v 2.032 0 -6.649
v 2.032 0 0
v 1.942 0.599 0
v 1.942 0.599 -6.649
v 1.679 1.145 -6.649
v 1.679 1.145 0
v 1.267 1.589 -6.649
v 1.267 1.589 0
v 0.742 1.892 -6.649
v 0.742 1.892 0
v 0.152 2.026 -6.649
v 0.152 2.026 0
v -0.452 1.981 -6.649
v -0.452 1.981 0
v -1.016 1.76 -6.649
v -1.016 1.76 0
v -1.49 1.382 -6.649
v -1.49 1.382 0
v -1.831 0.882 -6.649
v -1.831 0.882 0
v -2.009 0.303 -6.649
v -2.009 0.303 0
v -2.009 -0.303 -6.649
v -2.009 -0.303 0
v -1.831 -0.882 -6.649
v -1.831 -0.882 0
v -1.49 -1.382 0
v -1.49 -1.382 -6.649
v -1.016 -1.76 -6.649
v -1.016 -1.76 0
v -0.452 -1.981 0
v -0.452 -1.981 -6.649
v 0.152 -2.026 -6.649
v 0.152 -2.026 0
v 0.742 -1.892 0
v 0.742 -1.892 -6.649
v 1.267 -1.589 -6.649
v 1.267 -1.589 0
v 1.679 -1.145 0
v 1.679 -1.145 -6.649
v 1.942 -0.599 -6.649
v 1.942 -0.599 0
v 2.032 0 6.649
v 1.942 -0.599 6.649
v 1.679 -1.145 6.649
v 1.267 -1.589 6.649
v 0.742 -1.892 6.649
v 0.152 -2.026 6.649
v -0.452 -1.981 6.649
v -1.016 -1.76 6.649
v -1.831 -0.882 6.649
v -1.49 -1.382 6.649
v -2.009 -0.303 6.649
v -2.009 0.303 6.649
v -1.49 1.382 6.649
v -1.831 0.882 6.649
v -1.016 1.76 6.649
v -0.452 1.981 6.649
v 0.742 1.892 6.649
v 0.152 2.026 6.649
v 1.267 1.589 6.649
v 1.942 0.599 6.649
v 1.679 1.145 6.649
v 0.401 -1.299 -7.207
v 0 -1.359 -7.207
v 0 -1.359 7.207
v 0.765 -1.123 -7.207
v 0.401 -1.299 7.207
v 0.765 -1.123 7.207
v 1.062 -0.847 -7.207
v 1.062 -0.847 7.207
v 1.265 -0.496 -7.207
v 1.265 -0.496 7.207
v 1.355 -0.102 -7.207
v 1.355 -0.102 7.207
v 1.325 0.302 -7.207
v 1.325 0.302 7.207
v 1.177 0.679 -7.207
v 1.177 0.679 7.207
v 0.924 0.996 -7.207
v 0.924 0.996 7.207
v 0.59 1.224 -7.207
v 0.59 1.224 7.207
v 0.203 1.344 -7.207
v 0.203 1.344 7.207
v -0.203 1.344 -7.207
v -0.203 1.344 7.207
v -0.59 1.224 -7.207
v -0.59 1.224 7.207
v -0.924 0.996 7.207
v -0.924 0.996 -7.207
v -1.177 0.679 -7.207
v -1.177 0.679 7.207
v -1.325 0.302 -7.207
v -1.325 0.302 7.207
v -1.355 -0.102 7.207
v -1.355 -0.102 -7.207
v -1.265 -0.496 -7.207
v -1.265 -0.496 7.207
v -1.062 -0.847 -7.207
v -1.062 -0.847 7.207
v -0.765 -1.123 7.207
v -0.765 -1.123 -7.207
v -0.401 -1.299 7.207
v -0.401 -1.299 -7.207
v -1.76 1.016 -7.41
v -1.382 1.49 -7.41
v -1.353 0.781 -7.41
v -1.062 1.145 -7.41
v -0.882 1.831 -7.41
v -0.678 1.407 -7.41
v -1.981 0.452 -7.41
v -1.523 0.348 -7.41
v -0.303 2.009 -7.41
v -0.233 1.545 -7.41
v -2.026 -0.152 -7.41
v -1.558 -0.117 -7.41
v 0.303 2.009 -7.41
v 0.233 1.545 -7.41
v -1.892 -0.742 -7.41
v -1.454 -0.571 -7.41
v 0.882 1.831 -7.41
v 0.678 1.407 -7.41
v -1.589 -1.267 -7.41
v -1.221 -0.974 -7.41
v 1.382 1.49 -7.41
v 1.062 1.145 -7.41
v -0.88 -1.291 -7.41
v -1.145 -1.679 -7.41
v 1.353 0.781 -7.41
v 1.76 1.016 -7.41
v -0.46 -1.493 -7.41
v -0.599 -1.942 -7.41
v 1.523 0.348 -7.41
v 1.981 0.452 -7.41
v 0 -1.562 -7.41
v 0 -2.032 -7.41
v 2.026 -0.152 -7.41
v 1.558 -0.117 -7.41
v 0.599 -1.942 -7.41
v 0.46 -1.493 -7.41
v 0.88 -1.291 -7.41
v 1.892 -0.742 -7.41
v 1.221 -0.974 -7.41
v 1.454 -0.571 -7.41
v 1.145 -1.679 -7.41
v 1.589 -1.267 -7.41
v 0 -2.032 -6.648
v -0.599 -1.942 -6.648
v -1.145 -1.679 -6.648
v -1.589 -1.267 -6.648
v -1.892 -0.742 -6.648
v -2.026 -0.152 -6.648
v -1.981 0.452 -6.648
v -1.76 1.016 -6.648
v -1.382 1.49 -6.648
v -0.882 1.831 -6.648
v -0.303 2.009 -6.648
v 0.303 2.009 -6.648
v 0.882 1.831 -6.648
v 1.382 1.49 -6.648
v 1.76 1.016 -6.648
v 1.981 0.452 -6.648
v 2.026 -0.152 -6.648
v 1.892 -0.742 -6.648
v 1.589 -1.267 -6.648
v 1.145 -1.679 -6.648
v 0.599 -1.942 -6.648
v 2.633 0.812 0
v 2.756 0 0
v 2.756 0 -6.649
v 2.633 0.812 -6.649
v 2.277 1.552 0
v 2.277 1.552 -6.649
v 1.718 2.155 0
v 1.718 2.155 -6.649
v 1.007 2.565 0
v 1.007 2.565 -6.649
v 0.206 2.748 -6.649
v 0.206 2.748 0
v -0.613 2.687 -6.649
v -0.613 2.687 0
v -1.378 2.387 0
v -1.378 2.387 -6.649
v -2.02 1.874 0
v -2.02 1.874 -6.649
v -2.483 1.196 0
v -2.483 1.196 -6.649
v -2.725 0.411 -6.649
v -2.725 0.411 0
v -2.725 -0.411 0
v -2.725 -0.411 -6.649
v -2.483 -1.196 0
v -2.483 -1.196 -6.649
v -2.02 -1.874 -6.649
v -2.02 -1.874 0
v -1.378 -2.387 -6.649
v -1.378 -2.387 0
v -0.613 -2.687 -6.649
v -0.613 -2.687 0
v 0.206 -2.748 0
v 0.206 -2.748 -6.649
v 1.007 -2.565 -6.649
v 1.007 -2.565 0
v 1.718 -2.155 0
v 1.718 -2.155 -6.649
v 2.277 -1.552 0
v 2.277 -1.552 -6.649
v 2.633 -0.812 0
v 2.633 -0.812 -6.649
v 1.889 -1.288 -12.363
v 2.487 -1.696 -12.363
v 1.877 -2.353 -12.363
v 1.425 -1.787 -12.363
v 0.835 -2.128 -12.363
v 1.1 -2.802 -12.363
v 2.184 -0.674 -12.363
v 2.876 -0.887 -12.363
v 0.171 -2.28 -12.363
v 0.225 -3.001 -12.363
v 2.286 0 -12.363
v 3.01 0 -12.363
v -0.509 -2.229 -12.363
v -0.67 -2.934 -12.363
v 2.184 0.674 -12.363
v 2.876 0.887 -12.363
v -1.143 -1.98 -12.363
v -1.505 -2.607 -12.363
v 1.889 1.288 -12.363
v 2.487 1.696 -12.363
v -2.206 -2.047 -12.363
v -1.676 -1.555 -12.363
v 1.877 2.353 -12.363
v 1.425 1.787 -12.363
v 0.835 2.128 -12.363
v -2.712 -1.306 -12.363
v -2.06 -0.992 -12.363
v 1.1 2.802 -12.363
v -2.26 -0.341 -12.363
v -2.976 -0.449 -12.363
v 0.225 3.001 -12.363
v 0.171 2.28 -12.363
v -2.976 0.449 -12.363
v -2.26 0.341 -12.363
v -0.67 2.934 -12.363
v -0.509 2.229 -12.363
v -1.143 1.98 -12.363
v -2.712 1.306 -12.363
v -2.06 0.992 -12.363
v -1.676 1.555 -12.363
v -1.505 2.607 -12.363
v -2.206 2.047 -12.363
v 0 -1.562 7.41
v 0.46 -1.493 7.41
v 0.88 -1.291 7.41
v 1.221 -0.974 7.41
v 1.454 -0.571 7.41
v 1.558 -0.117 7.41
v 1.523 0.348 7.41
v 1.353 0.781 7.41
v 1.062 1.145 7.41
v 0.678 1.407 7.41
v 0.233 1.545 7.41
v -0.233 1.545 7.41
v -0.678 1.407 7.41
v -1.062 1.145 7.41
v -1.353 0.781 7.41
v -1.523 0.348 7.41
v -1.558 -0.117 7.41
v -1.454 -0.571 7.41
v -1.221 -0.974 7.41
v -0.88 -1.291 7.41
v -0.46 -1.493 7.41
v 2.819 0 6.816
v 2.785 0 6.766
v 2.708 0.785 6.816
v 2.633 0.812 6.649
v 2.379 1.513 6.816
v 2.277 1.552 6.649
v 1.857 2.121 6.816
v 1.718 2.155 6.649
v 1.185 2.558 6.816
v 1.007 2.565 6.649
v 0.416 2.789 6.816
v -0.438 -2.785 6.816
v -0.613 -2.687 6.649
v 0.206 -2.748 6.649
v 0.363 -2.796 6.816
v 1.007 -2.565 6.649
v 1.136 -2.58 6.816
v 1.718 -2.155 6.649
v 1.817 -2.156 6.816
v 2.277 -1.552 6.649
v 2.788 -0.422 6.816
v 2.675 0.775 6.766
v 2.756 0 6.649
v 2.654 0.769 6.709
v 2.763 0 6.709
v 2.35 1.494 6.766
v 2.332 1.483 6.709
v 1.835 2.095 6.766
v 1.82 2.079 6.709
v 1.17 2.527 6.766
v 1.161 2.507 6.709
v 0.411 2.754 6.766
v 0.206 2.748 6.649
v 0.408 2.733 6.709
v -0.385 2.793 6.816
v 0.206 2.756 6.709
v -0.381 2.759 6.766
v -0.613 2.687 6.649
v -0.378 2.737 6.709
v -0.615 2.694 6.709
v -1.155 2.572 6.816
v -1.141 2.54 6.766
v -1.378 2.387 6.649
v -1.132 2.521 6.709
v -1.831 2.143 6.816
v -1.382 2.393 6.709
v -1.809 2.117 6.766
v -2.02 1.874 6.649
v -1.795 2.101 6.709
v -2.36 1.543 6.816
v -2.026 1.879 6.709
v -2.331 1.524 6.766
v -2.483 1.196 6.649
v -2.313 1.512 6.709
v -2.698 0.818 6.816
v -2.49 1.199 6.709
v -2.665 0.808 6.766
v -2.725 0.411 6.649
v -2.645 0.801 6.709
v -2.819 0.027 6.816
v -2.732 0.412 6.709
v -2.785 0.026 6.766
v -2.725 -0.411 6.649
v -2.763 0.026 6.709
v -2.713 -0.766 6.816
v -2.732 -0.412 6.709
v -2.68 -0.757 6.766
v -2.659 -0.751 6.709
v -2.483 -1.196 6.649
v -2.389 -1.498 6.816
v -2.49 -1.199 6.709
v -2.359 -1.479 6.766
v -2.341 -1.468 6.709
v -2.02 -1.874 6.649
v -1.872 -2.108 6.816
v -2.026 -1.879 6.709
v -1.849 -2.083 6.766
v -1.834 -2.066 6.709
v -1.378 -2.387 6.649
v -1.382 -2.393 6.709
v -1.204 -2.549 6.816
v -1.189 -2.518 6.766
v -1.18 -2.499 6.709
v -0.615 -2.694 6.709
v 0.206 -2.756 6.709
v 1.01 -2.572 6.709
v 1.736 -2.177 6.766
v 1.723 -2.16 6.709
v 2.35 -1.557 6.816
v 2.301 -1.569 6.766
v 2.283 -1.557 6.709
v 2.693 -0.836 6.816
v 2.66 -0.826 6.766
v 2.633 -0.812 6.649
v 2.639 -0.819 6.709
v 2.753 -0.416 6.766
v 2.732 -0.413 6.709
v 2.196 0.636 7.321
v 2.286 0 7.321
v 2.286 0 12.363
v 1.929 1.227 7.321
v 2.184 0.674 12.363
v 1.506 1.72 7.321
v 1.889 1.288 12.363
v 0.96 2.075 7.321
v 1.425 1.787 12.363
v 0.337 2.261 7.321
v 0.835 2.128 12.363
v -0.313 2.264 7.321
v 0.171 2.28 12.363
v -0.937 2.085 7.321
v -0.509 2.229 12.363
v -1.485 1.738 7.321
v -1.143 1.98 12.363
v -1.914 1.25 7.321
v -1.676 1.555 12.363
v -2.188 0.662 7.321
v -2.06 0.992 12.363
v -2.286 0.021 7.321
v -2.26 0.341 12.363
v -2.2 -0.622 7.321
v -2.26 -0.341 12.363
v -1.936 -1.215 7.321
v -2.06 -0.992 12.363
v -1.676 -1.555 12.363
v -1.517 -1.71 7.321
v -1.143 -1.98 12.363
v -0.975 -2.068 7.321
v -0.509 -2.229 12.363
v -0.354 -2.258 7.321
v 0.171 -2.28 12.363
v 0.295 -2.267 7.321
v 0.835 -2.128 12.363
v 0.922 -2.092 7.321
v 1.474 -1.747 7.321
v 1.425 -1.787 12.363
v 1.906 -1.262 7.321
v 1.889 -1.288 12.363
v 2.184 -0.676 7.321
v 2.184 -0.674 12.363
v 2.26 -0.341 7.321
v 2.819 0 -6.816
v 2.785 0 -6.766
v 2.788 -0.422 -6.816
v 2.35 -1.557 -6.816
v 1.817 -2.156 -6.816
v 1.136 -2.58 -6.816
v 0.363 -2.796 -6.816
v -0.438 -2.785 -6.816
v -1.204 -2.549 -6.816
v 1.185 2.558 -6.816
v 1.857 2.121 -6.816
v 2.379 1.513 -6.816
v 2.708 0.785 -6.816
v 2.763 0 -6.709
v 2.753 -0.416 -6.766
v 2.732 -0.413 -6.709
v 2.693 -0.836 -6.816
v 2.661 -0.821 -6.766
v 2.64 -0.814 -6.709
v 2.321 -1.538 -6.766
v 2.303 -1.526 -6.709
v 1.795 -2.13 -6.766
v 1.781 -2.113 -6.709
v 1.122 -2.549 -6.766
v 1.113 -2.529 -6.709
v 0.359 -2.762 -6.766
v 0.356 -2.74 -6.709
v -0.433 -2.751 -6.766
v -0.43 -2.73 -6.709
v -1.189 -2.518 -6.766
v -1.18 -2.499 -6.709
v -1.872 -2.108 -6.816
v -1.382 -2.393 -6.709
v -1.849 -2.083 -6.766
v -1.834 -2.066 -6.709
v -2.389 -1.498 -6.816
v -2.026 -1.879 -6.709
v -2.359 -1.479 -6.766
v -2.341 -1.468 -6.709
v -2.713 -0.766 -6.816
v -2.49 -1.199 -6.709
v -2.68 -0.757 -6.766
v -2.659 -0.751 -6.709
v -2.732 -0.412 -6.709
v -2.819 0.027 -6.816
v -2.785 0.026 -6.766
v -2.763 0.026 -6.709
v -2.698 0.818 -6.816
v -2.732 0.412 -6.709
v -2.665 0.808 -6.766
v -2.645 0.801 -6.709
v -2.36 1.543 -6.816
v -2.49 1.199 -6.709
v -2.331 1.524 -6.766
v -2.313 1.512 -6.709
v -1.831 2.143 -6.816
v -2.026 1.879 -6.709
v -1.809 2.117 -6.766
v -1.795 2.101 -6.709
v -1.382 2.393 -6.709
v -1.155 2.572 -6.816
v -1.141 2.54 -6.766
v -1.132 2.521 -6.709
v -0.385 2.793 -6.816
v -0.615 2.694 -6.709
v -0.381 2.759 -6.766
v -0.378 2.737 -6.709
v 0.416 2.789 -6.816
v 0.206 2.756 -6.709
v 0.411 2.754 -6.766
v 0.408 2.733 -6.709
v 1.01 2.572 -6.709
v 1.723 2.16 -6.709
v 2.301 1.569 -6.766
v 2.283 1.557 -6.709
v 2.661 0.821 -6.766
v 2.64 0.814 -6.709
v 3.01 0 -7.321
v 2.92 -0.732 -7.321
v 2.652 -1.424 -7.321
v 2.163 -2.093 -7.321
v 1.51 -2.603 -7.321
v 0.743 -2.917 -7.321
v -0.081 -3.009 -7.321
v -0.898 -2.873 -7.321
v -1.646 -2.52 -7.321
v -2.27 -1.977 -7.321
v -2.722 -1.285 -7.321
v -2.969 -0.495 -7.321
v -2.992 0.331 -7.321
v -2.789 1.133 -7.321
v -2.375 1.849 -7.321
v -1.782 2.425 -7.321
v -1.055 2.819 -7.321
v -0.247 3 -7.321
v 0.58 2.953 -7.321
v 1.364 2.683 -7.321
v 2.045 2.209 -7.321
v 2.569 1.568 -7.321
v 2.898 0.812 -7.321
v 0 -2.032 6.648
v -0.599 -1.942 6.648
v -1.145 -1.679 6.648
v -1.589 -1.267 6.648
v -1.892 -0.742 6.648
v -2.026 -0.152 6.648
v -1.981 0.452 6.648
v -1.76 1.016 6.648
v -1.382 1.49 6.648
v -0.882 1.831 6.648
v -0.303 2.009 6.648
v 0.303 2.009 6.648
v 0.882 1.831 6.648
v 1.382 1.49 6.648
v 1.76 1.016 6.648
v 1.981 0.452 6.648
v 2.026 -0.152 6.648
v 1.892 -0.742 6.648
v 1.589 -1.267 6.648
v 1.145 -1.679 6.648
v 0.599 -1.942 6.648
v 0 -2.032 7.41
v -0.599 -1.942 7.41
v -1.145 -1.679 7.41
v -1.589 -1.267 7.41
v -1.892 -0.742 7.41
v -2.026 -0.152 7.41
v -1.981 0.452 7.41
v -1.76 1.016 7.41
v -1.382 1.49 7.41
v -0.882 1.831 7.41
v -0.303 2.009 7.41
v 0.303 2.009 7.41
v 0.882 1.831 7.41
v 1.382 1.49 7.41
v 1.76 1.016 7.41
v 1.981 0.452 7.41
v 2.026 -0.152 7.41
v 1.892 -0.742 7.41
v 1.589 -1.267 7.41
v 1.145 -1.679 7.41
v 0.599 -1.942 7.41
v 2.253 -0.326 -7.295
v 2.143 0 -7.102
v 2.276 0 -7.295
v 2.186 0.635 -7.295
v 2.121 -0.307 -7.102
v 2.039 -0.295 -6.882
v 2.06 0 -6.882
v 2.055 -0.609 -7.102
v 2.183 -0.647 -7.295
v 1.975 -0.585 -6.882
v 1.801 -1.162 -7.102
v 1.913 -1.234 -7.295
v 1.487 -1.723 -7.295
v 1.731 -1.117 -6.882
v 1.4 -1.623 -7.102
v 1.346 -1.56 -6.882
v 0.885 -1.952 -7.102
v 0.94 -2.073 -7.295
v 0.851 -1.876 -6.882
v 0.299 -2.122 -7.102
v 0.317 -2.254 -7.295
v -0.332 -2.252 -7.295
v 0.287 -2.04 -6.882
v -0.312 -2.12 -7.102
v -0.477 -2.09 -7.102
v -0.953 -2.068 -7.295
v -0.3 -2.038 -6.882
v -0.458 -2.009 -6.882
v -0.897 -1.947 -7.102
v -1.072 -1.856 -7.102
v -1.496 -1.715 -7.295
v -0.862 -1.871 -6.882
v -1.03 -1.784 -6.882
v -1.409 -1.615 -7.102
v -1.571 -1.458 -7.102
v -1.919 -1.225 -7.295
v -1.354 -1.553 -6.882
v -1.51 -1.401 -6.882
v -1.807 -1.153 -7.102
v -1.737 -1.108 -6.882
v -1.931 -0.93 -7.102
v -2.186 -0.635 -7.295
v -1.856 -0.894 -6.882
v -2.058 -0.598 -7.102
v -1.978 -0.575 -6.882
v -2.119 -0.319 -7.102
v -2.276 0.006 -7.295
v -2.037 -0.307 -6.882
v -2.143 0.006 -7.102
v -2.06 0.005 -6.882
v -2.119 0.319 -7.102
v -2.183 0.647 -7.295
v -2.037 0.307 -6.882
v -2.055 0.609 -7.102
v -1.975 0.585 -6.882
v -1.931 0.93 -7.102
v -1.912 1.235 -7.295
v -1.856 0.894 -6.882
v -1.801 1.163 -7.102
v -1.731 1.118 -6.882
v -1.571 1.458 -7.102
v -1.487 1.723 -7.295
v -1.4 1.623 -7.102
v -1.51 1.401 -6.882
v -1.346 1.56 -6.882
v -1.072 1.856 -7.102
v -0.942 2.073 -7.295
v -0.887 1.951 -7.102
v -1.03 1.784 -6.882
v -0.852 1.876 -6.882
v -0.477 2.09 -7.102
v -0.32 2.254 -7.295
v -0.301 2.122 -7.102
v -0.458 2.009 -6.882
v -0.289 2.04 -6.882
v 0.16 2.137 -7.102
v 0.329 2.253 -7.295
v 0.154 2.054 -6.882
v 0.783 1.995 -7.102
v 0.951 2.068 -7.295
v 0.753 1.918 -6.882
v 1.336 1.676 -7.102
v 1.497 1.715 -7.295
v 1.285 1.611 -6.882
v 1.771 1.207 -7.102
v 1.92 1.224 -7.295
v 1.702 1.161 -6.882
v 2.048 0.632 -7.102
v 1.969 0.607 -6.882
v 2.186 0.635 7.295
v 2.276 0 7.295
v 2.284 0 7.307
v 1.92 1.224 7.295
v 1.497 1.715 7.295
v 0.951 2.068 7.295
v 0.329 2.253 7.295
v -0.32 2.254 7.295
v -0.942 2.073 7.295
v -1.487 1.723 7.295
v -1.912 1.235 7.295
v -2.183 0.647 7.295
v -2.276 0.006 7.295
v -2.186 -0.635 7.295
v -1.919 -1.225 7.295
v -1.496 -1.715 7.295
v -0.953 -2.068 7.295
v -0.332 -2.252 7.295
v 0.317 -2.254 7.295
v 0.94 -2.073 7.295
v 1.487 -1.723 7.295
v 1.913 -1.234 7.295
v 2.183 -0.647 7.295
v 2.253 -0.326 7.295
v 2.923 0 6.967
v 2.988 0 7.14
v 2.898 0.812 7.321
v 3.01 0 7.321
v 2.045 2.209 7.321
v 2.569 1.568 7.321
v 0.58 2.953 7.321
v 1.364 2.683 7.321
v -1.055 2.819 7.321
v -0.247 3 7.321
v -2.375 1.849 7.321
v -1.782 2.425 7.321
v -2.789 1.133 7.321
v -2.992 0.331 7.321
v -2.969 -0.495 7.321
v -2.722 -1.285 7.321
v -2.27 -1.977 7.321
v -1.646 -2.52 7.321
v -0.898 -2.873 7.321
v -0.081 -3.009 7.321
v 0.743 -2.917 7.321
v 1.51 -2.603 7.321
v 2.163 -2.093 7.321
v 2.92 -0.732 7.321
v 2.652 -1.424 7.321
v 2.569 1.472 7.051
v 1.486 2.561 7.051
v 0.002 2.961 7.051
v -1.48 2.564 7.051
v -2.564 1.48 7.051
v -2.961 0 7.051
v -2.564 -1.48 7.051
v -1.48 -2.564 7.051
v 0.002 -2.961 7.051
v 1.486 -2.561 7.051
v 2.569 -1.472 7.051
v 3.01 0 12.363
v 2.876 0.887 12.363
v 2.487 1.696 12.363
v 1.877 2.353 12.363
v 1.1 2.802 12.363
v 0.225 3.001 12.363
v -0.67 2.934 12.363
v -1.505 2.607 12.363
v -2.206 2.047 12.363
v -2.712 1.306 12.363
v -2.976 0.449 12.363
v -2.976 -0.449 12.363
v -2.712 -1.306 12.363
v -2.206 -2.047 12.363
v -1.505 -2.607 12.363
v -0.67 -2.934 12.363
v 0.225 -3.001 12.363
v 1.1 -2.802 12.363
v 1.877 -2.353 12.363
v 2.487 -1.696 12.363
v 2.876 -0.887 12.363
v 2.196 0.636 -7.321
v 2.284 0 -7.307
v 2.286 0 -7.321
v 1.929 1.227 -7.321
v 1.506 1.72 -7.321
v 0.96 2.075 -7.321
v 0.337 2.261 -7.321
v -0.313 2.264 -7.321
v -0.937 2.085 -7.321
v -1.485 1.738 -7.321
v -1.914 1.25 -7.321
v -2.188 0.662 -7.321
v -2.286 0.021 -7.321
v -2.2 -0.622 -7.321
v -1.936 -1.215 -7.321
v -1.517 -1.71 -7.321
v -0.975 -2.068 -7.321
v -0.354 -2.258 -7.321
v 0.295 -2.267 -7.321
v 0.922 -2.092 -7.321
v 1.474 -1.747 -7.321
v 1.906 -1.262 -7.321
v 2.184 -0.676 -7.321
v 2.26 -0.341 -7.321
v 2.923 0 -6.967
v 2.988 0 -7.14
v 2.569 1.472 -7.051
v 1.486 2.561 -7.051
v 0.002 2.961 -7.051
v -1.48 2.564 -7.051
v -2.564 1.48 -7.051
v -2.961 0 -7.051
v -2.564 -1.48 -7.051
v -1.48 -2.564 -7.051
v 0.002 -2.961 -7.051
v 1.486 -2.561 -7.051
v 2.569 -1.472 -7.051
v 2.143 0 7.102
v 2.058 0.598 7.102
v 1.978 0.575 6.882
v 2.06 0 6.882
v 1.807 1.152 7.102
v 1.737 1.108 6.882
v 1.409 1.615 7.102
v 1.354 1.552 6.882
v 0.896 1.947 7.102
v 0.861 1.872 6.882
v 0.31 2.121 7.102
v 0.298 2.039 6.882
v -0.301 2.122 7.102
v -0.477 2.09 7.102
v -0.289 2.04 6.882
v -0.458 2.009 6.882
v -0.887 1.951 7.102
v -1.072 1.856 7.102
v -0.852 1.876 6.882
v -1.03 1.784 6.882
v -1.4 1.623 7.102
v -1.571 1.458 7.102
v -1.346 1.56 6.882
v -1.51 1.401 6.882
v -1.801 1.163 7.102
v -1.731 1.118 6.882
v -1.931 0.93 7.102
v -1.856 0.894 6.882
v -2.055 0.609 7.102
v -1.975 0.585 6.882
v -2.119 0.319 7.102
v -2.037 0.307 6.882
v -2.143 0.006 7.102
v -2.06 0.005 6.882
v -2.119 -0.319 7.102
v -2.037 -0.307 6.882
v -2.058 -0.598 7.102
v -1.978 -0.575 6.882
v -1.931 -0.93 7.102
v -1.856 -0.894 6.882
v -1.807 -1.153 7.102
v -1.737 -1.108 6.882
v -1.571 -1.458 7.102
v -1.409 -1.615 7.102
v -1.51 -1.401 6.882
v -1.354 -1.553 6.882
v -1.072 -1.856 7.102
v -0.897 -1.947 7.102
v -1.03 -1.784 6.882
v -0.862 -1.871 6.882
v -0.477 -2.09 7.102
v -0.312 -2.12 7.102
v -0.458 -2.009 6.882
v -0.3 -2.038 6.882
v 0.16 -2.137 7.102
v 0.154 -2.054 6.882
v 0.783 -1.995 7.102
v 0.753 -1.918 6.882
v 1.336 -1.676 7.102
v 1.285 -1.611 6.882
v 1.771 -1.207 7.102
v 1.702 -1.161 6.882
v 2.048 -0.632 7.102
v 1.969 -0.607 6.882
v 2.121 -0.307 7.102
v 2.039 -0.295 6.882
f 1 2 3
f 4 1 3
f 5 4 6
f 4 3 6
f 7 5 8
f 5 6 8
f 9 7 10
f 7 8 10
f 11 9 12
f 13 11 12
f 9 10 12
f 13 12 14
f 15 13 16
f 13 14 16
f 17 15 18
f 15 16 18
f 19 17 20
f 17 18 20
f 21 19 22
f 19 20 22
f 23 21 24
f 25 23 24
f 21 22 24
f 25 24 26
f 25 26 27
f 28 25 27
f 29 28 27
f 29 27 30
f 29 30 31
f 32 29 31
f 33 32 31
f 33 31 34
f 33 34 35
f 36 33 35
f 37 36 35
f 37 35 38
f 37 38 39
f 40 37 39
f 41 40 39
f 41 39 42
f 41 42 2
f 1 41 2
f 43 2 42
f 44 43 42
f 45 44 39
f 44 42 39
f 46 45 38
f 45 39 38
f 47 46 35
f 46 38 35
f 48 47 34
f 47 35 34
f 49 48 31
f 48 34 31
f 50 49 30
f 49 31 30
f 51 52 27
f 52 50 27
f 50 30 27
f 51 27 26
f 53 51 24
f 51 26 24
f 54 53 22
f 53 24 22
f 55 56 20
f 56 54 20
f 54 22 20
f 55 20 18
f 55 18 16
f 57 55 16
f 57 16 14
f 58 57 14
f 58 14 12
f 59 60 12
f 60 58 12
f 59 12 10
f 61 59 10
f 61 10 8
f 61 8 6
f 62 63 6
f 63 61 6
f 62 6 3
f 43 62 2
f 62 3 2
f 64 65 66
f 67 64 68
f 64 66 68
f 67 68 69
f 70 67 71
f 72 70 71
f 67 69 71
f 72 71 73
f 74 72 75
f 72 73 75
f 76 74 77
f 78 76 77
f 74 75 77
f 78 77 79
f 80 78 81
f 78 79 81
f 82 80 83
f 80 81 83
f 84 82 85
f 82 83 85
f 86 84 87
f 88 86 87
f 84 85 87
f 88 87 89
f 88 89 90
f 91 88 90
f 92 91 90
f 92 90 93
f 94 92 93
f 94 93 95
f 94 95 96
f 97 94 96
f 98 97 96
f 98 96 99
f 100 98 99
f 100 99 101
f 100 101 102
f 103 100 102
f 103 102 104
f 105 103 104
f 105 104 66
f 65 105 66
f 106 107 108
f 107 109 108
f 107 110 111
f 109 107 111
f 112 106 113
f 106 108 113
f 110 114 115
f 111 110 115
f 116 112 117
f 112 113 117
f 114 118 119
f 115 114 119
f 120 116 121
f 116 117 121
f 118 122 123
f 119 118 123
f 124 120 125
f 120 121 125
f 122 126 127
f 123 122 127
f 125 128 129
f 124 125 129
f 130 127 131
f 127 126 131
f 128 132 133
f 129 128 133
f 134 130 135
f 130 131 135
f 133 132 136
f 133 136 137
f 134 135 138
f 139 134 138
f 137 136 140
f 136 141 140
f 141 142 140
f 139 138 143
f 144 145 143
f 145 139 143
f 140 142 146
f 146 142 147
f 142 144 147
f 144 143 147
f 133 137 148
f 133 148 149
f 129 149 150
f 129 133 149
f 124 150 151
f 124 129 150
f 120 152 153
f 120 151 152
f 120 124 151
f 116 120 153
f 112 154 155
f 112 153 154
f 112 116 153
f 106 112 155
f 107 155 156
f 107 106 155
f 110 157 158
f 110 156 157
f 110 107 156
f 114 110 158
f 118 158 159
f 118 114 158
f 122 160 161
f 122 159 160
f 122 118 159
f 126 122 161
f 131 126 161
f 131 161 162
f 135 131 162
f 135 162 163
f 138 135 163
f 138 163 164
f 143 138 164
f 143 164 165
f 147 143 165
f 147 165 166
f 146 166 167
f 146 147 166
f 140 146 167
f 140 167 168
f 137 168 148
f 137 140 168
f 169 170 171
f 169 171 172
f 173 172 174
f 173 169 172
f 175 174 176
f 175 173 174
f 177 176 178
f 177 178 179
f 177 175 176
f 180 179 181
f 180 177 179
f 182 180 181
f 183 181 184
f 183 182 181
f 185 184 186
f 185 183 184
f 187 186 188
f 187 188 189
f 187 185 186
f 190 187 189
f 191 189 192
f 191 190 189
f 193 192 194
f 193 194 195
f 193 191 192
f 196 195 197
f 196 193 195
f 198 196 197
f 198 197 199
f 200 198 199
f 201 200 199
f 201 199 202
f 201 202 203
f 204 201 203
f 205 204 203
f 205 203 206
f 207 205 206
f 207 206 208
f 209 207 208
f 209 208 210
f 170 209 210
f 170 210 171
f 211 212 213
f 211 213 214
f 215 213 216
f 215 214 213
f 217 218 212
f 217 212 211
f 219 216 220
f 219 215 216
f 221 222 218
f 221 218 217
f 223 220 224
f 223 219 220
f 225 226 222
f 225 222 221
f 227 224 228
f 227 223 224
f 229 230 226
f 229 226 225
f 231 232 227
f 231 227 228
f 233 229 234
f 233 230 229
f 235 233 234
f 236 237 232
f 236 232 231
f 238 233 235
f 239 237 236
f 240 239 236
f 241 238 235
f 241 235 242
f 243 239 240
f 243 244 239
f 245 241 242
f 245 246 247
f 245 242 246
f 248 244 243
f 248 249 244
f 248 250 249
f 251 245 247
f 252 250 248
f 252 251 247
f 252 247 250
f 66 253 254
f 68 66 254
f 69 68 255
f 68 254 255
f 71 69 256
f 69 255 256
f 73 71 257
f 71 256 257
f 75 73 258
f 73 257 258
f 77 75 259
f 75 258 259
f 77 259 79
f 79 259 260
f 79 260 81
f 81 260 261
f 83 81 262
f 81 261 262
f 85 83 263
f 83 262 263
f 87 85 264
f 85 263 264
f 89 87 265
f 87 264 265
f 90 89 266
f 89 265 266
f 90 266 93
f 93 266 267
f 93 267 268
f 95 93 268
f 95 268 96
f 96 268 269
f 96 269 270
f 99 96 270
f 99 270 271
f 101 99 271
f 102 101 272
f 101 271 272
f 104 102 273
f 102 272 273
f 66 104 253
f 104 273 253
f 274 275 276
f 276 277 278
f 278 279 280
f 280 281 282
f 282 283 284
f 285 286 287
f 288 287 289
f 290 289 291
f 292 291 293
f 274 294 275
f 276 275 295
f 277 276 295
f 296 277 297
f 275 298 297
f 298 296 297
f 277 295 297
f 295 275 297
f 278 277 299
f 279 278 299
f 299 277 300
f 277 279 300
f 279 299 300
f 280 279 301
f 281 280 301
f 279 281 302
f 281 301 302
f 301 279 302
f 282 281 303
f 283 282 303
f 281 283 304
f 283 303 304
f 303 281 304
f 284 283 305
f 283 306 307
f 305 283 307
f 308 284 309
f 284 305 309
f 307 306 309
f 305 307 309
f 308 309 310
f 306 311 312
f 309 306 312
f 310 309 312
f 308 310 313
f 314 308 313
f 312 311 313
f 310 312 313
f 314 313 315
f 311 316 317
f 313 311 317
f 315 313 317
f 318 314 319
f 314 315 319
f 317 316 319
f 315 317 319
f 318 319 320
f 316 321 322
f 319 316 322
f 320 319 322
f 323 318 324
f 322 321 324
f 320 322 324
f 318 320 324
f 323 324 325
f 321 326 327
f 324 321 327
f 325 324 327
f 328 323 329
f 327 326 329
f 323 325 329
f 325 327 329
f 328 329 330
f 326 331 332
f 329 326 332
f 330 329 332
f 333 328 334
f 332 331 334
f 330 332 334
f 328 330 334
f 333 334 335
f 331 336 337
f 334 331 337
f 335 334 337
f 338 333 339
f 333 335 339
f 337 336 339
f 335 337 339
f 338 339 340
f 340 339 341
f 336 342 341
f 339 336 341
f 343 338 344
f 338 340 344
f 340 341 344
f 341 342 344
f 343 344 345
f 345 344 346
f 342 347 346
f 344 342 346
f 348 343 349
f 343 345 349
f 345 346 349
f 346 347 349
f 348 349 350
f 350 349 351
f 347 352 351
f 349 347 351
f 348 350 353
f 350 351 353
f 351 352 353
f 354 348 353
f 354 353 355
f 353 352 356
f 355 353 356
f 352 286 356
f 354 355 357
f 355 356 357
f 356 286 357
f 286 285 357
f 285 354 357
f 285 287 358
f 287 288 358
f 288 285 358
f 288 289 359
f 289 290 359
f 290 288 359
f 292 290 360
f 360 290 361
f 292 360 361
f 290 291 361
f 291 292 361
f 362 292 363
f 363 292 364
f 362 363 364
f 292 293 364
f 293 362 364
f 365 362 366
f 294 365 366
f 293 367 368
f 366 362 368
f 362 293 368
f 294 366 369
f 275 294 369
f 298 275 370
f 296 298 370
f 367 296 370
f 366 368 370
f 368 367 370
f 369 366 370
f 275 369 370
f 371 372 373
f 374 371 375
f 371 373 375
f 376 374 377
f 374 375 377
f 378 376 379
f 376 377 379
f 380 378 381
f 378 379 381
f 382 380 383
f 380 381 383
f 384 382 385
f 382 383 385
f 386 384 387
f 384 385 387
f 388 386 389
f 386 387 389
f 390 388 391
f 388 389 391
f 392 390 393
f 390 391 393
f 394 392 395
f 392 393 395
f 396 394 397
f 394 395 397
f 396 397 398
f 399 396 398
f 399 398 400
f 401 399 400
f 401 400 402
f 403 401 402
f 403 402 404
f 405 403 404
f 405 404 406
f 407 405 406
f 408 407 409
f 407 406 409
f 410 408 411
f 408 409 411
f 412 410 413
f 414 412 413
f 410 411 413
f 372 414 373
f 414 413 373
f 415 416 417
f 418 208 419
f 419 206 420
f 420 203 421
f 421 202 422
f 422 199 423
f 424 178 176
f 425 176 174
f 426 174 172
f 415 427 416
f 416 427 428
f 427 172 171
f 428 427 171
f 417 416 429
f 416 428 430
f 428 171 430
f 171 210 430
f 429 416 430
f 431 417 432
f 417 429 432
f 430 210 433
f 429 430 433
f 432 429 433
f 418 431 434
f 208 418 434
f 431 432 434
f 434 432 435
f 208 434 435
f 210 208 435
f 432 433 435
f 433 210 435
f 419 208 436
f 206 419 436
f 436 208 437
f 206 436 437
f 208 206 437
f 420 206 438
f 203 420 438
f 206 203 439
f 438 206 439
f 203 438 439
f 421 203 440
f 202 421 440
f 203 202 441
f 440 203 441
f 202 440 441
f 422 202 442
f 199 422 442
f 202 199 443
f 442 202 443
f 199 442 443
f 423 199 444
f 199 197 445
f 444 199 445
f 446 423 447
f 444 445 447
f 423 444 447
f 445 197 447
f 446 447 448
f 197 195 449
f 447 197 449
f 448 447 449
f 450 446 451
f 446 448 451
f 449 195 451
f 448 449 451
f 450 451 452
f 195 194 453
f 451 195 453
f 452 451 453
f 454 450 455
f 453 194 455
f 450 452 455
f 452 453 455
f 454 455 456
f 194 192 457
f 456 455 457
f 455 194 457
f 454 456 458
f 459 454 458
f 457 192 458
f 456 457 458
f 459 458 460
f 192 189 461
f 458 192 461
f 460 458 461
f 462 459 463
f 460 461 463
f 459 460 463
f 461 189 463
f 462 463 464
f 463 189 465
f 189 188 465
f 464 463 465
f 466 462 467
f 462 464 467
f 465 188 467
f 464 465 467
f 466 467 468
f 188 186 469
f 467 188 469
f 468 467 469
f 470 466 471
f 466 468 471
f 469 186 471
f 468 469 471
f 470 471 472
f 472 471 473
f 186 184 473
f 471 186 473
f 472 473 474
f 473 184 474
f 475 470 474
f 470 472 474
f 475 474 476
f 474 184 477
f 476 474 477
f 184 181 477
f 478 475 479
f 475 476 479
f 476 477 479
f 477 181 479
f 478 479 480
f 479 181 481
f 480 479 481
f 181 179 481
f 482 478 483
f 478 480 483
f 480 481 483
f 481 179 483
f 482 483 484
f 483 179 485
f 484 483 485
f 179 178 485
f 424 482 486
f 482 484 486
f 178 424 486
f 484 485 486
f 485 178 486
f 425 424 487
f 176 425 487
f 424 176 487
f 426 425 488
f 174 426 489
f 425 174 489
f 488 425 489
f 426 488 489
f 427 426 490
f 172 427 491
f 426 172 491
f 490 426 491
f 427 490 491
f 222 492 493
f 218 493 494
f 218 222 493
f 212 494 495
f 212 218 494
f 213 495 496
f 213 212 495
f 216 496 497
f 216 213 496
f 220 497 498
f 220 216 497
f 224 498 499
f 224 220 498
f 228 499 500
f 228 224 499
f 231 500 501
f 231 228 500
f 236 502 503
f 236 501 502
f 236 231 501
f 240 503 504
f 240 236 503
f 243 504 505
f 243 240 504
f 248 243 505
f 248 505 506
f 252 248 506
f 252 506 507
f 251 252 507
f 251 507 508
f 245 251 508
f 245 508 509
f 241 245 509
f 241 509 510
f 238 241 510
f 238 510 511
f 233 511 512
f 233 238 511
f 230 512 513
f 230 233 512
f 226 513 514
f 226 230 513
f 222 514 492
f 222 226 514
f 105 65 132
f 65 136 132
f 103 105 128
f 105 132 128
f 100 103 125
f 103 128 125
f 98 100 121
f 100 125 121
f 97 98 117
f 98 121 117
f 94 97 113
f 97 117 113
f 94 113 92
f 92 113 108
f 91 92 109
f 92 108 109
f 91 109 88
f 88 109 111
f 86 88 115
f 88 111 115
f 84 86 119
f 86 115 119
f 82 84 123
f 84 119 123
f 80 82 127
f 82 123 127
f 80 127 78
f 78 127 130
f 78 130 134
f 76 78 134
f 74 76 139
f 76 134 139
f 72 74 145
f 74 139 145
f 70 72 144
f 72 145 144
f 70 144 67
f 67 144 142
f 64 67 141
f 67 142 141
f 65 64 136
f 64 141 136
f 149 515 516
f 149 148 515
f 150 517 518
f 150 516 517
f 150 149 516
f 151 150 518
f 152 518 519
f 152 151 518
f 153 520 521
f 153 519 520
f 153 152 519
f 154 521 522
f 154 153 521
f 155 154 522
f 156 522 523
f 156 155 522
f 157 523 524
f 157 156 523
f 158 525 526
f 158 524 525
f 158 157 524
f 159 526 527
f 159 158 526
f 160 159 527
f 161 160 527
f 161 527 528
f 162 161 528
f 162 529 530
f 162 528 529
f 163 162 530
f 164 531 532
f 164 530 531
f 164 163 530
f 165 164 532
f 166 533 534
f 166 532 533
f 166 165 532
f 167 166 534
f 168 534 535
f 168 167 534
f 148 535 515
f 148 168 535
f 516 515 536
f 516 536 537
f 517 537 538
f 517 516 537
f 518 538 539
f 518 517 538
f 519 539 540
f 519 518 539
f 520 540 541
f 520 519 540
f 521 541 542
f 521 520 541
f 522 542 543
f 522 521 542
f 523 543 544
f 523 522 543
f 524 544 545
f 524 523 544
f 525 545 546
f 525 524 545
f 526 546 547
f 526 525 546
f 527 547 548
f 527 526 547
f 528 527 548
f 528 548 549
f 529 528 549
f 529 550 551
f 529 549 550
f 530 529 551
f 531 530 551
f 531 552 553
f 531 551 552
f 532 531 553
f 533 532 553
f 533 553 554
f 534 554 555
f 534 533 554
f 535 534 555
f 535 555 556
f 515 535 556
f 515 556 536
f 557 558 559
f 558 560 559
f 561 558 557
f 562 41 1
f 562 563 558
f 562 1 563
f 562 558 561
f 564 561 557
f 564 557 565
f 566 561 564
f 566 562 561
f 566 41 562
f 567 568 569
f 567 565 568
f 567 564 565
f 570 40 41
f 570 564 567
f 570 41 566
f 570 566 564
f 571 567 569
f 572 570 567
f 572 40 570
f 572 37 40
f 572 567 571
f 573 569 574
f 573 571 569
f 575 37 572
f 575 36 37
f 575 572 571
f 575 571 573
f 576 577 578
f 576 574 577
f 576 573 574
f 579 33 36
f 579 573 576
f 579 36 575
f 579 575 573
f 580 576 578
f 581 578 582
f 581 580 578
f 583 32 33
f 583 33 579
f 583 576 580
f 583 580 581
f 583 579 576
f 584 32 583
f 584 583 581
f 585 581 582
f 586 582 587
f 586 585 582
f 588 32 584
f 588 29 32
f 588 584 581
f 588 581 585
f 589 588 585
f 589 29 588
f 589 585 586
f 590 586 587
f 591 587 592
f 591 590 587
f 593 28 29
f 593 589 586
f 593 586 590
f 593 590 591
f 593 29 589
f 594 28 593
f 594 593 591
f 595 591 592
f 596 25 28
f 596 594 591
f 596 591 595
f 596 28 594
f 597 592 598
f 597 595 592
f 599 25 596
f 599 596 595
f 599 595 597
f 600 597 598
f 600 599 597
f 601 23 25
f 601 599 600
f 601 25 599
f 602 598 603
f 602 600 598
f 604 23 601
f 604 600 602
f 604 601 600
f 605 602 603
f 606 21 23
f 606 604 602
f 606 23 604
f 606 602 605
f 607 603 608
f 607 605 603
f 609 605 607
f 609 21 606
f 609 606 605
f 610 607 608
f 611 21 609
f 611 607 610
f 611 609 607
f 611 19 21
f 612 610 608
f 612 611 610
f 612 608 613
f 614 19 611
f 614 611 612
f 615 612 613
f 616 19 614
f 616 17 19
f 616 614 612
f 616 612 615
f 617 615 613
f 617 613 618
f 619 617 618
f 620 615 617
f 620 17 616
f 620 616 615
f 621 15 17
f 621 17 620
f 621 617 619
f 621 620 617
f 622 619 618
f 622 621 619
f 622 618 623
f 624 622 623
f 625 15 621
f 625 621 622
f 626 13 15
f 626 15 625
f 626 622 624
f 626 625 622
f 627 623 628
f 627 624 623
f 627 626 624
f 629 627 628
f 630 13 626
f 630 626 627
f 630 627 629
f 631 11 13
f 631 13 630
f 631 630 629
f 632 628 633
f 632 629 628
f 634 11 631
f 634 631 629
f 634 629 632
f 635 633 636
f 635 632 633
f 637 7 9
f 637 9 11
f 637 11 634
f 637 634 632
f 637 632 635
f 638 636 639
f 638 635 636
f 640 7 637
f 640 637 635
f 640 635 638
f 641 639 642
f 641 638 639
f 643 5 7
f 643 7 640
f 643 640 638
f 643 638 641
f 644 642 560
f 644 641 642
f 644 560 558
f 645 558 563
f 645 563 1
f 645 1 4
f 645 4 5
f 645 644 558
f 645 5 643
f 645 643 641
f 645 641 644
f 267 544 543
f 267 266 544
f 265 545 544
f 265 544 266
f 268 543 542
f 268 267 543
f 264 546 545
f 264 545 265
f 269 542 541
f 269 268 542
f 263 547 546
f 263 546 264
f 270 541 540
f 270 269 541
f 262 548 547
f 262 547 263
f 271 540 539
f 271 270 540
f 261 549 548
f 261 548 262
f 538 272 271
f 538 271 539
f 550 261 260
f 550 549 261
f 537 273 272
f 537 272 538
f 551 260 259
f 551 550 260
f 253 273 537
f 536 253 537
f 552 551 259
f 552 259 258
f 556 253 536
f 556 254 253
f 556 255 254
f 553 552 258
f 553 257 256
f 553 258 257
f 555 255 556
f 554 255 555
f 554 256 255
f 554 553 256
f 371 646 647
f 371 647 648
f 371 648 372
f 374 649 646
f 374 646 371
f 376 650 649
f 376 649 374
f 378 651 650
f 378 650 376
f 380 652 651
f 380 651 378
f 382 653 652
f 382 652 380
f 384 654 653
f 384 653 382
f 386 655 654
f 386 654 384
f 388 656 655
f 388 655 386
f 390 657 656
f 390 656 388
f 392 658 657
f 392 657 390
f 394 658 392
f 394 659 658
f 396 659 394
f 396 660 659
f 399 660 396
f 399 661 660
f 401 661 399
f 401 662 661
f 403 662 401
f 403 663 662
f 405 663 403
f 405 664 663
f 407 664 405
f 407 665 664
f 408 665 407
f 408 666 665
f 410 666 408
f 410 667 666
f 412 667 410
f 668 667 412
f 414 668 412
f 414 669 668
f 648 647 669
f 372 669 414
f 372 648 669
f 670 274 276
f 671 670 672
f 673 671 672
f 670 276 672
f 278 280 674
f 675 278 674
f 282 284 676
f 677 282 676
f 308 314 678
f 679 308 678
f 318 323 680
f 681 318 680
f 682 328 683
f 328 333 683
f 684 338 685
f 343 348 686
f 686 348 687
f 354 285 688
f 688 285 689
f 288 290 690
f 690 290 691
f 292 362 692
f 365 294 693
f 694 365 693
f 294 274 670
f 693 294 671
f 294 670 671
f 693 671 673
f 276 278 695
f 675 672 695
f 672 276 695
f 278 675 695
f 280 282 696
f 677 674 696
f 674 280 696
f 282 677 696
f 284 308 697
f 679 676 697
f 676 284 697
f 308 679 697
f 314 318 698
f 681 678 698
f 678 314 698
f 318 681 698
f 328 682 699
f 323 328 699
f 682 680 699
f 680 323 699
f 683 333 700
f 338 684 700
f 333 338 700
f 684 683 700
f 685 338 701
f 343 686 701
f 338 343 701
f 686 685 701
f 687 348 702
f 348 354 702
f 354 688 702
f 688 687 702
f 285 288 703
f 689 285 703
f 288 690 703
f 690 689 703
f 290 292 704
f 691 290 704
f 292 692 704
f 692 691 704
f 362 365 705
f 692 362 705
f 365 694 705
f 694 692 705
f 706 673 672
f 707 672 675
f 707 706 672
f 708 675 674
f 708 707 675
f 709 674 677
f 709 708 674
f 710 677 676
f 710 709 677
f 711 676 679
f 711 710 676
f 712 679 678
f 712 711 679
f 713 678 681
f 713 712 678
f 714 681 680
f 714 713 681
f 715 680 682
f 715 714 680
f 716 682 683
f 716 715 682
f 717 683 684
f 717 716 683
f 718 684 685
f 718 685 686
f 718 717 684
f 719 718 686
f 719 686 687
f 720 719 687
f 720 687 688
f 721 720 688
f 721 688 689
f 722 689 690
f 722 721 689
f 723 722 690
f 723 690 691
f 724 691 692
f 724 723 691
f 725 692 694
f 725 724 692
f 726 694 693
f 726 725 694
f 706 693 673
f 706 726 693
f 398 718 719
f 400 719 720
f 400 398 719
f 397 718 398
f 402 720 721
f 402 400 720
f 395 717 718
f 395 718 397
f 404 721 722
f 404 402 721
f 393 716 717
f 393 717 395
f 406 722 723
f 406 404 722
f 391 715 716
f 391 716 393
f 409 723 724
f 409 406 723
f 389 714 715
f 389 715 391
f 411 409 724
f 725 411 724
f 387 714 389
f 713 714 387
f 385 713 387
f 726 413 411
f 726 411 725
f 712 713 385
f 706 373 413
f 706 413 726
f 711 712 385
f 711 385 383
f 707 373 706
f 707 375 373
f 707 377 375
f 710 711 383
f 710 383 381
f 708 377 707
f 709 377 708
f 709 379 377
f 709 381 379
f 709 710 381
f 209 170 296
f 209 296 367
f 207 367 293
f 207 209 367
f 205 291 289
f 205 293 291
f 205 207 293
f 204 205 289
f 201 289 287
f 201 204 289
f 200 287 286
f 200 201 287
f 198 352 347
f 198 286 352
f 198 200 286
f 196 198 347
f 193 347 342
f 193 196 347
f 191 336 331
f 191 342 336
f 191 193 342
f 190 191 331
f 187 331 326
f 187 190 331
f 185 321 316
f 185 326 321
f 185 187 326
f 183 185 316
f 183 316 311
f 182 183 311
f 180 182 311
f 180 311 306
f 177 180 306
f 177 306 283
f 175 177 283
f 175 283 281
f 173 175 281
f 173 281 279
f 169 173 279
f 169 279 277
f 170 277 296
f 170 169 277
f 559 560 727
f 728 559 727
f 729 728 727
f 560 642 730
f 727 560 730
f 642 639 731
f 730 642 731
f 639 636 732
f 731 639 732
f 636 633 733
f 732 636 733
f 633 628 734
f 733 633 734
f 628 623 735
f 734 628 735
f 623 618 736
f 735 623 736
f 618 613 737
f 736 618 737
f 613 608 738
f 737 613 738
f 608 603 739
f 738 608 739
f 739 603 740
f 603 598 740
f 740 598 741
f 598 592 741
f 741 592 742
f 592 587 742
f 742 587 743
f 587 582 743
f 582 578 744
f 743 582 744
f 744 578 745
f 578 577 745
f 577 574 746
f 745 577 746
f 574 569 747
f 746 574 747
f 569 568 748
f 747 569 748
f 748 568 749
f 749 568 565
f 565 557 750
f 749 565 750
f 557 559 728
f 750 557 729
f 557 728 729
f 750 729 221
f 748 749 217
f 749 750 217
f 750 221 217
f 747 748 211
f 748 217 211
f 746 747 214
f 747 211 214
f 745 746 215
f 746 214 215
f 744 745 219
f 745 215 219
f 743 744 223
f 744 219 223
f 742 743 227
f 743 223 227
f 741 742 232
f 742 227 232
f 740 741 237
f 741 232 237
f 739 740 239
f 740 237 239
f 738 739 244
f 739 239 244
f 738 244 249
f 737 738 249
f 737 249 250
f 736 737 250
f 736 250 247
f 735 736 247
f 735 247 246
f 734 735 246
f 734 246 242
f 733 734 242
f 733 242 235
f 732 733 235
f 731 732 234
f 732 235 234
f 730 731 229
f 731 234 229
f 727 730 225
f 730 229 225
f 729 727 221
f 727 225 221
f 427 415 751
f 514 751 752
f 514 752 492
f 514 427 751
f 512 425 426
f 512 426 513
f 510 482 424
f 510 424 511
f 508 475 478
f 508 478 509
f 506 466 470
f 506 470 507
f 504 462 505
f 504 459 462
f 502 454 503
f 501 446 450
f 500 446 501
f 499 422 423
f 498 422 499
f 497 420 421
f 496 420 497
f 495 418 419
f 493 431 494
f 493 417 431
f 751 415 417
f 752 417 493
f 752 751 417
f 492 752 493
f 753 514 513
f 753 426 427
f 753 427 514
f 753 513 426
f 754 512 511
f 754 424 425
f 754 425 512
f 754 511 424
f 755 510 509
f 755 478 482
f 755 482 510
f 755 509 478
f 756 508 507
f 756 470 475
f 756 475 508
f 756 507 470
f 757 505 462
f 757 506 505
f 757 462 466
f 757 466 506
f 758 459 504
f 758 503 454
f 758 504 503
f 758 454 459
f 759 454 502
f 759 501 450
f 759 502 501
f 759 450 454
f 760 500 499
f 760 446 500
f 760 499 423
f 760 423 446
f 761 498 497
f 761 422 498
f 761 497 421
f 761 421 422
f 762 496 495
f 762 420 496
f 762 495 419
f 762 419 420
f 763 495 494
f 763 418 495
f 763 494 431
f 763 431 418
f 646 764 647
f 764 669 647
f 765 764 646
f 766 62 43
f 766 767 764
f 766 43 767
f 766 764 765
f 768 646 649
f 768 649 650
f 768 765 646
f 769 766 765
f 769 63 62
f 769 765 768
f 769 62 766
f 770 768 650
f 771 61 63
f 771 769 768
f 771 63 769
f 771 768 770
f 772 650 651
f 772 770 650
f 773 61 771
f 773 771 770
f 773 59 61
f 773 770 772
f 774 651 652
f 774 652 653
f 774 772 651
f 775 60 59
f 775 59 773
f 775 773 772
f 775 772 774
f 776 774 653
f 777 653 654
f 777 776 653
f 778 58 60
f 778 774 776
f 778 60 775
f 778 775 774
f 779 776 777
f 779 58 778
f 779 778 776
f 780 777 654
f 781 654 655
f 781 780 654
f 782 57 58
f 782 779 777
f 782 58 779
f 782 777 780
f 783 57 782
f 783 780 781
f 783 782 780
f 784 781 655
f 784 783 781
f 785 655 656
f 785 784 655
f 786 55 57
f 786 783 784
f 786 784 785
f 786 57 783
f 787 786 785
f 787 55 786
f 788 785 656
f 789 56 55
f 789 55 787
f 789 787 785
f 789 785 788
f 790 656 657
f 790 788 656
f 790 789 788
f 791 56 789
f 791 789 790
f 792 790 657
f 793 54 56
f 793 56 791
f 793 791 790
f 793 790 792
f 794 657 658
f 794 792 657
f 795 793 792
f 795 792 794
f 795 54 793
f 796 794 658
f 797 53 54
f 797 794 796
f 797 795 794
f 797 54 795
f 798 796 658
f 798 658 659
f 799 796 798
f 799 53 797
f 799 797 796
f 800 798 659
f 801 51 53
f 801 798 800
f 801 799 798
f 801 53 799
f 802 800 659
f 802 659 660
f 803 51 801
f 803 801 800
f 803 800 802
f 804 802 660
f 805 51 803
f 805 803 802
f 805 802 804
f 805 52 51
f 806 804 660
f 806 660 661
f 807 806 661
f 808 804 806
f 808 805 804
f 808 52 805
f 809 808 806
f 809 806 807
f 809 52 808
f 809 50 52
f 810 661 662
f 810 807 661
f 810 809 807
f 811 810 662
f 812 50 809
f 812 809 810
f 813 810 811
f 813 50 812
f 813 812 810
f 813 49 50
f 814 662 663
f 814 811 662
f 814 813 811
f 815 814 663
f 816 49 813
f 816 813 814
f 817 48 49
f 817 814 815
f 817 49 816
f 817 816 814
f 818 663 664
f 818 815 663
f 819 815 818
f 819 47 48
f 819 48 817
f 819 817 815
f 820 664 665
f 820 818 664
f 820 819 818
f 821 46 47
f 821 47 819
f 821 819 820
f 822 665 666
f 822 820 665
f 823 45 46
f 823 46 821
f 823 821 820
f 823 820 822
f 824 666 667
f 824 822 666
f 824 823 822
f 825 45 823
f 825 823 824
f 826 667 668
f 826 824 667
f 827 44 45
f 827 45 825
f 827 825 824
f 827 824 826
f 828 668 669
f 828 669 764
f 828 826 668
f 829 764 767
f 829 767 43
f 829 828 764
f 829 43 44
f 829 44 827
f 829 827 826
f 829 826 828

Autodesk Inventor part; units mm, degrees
ref_plane "YZ Plane" through (0, 0, 0) normal (1, 0, 0) x (0, 1, 0)
ref_plane "XZ Plane" through (0, 0, 0) normal (0, 1, 0) x (-1, 0, 0)
ref_plane "XY Plane" through (0, 0, 0) normal (0, 0, 1) x (1, 0, 0)
sketch "Sketch1" plane through (0, 0, 0) normal (0, 0, 1) x (1, 0, 0)
  circle A0 centre (0, 0) radius 2.7559
  dimension "d0" = 5.5118
extrude "Extrusion1" add sketch "Sketch1" along normal mid plane 24.7269
sketch "Sketch2" plane through (0, 0, 12.36345) normal (0, 0, 1) x (1, 0, 0)
  circle A0 centre (0, 0) radius 2.7559 projected
  circle A1 centre (0, 0) radius 3.0099
  dimension "d3" = 6.0198
extrude "Extrusion2" add sketch "Sketch2" against normal blind 5.461
fillet "Fillet1" radius 0.254 1 edges at (-2.7559, 0, 6.9024)
fillet "Fillet2" radius 0.762 2 edges at (-3.0098, 0, 6.9024) (-3.0099, 0, 6.9024)
mirror "Mirror1" about plane through (0, 0, 0) normal (0, 0, 1) of "Extrusion2", "Fillet1", "Fillet2"
shell "Shell1" thickness 0.7239 removed faces 2 at (0.974146, -1.090517, -12.36345) at (0.974146, -1.090517, 12.36345)
sketch "Sketch3" plane through (0, 0, 0) normal (1, 0, 0) x (0, 1, 0)
  arc A0 (-3.0099, 7.320471) -> (-2.8194, 6.816455) centre (-2.2479, 7.320471) ccw
  line L0 (-3.0099, 7.320471) -> (-3.0099, 12.36345)
  line L1 (-3.0099, 12.36345) -> (-2.286, 12.36345)
  line L2 (-2.286, 12.36345) -> (-2.286, 7.320471)
  arc A1 (-2.286, 7.320471) -> (-2.276475, 7.29527) centre (-2.2479, 7.320471) ccw
  arc A2 (-2.032, 6.64845) -> (-2.276475, 7.29527) centre (-3.0099, 6.64845) ccw
  line L3 (-2.032, 6.64845) -> (-2.032, -6.64845)
  arc A3 (-2.276475, -7.29527) -> (-2.032, -6.64845) centre (-3.0099, -6.64845) ccw
  arc A4 (-2.276475, -7.29527) -> (-2.286, -7.320471) centre (-2.2479, -7.320471) ccw
  line L4 (-2.286, -7.320471) -> (-2.286, -12.36345)
  line L5 (-2.286, -12.36345) -> (-3.0099, -12.36345)
  line L6 (-3.0099, -12.36345) -> (-3.0099, -7.320471)
  arc A5 (-2.8194, -6.816455) -> (-3.0099, -7.320471) centre (-2.2479, -7.320471) ccw
  arc A6 (-2.8194, -6.816455) -> (-2.7559, -6.64845) centre (-3.0099, -6.64845) ccw
  line L7 (-2.7559, -6.64845) -> (-2.7559, 6.64845)
  arc A7 (-2.7559, 6.64845) -> (-2.8194, 6.816455) centre (-3.0099, 6.64845) ccw
  arc A8 (2.8194, 6.816455) -> (3.0099, 7.320471) centre (2.2479, 7.320471) ccw
  arc A9 (2.8194, 6.816455) -> (2.7559, 6.64845) centre (3.0099, 6.64845) ccw
  line L8 (2.7559, 6.64845) -> (2.7559, -6.64845)
  arc A10 (2.7559, -6.64845) -> (2.8194, -6.816455) centre (3.0099, -6.64845) ccw
  arc A11 (3.0099, -7.320471) -> (2.8194, -6.816455) centre (2.2479, -7.320471) ccw
  line L9 (3.0099, -7.320471) -> (3.0099, -12.36345)
  line L10 (3.0099, -12.36345) -> (2.286, -12.36345)
  line L11 (2.286, -12.36345) -> (2.286, -7.320471)
  arc A12 (2.286, -7.320471) -> (2.276475, -7.29527) centre (2.2479, -7.320471) ccw
  arc A13 (2.032, -6.64845) -> (2.276475, -7.29527) centre (3.0099, -6.64845) ccw
  line L12 (2.032, -6.64845) -> (2.032, 6.64845)
  arc A14 (2.276475, 7.29527) -> (2.032, 6.64845) centre (3.0099, 6.64845) ccw
  arc A15 (2.276475, 7.29527) -> (2.286, 7.320471) centre (2.2479, 7.320471) ccw
  line L13 (2.286, 7.320471) -> (2.286, 12.36345)
  line L14 (2.286, 12.36345) -> (3.0099, 12.36345)
  line L15 (3.0099, 12.36345) -> (3.0099, 7.320471)
  line L16 (-2.032, -7.41045) -> (-1.3589, -7.41045)
  line L17 (-1.3589, -7.41045) -> (-1.3589, 7.41045)
  line L18 (-1.3589, 7.41045) -> (-2.032, 7.41045)
  line L19 (-2.032, 7.41045) -> (-2.032, -7.41045)
  line L20 (0, -17.30883) -> (0, 17.30883)
  point P0 (0, 0)
  dimension "d9" = 0.6731
  dimension "d10" = 0.762
  dimension "d11" = 0.762
revolve "Revolution1" add sketch "Sketch3" angle 360 about axis through (0, 0, -10) along (0, 0, 1) separate body contours L19 L18 L17 L16 L3
chamfer "Chamfer1" distance 0.2032 angle 45 2 edges at (0, 1.3589, 7.4105) (0, 1.3589, -7.4105)
properties part number "point 107 double sided femal tube blue"
